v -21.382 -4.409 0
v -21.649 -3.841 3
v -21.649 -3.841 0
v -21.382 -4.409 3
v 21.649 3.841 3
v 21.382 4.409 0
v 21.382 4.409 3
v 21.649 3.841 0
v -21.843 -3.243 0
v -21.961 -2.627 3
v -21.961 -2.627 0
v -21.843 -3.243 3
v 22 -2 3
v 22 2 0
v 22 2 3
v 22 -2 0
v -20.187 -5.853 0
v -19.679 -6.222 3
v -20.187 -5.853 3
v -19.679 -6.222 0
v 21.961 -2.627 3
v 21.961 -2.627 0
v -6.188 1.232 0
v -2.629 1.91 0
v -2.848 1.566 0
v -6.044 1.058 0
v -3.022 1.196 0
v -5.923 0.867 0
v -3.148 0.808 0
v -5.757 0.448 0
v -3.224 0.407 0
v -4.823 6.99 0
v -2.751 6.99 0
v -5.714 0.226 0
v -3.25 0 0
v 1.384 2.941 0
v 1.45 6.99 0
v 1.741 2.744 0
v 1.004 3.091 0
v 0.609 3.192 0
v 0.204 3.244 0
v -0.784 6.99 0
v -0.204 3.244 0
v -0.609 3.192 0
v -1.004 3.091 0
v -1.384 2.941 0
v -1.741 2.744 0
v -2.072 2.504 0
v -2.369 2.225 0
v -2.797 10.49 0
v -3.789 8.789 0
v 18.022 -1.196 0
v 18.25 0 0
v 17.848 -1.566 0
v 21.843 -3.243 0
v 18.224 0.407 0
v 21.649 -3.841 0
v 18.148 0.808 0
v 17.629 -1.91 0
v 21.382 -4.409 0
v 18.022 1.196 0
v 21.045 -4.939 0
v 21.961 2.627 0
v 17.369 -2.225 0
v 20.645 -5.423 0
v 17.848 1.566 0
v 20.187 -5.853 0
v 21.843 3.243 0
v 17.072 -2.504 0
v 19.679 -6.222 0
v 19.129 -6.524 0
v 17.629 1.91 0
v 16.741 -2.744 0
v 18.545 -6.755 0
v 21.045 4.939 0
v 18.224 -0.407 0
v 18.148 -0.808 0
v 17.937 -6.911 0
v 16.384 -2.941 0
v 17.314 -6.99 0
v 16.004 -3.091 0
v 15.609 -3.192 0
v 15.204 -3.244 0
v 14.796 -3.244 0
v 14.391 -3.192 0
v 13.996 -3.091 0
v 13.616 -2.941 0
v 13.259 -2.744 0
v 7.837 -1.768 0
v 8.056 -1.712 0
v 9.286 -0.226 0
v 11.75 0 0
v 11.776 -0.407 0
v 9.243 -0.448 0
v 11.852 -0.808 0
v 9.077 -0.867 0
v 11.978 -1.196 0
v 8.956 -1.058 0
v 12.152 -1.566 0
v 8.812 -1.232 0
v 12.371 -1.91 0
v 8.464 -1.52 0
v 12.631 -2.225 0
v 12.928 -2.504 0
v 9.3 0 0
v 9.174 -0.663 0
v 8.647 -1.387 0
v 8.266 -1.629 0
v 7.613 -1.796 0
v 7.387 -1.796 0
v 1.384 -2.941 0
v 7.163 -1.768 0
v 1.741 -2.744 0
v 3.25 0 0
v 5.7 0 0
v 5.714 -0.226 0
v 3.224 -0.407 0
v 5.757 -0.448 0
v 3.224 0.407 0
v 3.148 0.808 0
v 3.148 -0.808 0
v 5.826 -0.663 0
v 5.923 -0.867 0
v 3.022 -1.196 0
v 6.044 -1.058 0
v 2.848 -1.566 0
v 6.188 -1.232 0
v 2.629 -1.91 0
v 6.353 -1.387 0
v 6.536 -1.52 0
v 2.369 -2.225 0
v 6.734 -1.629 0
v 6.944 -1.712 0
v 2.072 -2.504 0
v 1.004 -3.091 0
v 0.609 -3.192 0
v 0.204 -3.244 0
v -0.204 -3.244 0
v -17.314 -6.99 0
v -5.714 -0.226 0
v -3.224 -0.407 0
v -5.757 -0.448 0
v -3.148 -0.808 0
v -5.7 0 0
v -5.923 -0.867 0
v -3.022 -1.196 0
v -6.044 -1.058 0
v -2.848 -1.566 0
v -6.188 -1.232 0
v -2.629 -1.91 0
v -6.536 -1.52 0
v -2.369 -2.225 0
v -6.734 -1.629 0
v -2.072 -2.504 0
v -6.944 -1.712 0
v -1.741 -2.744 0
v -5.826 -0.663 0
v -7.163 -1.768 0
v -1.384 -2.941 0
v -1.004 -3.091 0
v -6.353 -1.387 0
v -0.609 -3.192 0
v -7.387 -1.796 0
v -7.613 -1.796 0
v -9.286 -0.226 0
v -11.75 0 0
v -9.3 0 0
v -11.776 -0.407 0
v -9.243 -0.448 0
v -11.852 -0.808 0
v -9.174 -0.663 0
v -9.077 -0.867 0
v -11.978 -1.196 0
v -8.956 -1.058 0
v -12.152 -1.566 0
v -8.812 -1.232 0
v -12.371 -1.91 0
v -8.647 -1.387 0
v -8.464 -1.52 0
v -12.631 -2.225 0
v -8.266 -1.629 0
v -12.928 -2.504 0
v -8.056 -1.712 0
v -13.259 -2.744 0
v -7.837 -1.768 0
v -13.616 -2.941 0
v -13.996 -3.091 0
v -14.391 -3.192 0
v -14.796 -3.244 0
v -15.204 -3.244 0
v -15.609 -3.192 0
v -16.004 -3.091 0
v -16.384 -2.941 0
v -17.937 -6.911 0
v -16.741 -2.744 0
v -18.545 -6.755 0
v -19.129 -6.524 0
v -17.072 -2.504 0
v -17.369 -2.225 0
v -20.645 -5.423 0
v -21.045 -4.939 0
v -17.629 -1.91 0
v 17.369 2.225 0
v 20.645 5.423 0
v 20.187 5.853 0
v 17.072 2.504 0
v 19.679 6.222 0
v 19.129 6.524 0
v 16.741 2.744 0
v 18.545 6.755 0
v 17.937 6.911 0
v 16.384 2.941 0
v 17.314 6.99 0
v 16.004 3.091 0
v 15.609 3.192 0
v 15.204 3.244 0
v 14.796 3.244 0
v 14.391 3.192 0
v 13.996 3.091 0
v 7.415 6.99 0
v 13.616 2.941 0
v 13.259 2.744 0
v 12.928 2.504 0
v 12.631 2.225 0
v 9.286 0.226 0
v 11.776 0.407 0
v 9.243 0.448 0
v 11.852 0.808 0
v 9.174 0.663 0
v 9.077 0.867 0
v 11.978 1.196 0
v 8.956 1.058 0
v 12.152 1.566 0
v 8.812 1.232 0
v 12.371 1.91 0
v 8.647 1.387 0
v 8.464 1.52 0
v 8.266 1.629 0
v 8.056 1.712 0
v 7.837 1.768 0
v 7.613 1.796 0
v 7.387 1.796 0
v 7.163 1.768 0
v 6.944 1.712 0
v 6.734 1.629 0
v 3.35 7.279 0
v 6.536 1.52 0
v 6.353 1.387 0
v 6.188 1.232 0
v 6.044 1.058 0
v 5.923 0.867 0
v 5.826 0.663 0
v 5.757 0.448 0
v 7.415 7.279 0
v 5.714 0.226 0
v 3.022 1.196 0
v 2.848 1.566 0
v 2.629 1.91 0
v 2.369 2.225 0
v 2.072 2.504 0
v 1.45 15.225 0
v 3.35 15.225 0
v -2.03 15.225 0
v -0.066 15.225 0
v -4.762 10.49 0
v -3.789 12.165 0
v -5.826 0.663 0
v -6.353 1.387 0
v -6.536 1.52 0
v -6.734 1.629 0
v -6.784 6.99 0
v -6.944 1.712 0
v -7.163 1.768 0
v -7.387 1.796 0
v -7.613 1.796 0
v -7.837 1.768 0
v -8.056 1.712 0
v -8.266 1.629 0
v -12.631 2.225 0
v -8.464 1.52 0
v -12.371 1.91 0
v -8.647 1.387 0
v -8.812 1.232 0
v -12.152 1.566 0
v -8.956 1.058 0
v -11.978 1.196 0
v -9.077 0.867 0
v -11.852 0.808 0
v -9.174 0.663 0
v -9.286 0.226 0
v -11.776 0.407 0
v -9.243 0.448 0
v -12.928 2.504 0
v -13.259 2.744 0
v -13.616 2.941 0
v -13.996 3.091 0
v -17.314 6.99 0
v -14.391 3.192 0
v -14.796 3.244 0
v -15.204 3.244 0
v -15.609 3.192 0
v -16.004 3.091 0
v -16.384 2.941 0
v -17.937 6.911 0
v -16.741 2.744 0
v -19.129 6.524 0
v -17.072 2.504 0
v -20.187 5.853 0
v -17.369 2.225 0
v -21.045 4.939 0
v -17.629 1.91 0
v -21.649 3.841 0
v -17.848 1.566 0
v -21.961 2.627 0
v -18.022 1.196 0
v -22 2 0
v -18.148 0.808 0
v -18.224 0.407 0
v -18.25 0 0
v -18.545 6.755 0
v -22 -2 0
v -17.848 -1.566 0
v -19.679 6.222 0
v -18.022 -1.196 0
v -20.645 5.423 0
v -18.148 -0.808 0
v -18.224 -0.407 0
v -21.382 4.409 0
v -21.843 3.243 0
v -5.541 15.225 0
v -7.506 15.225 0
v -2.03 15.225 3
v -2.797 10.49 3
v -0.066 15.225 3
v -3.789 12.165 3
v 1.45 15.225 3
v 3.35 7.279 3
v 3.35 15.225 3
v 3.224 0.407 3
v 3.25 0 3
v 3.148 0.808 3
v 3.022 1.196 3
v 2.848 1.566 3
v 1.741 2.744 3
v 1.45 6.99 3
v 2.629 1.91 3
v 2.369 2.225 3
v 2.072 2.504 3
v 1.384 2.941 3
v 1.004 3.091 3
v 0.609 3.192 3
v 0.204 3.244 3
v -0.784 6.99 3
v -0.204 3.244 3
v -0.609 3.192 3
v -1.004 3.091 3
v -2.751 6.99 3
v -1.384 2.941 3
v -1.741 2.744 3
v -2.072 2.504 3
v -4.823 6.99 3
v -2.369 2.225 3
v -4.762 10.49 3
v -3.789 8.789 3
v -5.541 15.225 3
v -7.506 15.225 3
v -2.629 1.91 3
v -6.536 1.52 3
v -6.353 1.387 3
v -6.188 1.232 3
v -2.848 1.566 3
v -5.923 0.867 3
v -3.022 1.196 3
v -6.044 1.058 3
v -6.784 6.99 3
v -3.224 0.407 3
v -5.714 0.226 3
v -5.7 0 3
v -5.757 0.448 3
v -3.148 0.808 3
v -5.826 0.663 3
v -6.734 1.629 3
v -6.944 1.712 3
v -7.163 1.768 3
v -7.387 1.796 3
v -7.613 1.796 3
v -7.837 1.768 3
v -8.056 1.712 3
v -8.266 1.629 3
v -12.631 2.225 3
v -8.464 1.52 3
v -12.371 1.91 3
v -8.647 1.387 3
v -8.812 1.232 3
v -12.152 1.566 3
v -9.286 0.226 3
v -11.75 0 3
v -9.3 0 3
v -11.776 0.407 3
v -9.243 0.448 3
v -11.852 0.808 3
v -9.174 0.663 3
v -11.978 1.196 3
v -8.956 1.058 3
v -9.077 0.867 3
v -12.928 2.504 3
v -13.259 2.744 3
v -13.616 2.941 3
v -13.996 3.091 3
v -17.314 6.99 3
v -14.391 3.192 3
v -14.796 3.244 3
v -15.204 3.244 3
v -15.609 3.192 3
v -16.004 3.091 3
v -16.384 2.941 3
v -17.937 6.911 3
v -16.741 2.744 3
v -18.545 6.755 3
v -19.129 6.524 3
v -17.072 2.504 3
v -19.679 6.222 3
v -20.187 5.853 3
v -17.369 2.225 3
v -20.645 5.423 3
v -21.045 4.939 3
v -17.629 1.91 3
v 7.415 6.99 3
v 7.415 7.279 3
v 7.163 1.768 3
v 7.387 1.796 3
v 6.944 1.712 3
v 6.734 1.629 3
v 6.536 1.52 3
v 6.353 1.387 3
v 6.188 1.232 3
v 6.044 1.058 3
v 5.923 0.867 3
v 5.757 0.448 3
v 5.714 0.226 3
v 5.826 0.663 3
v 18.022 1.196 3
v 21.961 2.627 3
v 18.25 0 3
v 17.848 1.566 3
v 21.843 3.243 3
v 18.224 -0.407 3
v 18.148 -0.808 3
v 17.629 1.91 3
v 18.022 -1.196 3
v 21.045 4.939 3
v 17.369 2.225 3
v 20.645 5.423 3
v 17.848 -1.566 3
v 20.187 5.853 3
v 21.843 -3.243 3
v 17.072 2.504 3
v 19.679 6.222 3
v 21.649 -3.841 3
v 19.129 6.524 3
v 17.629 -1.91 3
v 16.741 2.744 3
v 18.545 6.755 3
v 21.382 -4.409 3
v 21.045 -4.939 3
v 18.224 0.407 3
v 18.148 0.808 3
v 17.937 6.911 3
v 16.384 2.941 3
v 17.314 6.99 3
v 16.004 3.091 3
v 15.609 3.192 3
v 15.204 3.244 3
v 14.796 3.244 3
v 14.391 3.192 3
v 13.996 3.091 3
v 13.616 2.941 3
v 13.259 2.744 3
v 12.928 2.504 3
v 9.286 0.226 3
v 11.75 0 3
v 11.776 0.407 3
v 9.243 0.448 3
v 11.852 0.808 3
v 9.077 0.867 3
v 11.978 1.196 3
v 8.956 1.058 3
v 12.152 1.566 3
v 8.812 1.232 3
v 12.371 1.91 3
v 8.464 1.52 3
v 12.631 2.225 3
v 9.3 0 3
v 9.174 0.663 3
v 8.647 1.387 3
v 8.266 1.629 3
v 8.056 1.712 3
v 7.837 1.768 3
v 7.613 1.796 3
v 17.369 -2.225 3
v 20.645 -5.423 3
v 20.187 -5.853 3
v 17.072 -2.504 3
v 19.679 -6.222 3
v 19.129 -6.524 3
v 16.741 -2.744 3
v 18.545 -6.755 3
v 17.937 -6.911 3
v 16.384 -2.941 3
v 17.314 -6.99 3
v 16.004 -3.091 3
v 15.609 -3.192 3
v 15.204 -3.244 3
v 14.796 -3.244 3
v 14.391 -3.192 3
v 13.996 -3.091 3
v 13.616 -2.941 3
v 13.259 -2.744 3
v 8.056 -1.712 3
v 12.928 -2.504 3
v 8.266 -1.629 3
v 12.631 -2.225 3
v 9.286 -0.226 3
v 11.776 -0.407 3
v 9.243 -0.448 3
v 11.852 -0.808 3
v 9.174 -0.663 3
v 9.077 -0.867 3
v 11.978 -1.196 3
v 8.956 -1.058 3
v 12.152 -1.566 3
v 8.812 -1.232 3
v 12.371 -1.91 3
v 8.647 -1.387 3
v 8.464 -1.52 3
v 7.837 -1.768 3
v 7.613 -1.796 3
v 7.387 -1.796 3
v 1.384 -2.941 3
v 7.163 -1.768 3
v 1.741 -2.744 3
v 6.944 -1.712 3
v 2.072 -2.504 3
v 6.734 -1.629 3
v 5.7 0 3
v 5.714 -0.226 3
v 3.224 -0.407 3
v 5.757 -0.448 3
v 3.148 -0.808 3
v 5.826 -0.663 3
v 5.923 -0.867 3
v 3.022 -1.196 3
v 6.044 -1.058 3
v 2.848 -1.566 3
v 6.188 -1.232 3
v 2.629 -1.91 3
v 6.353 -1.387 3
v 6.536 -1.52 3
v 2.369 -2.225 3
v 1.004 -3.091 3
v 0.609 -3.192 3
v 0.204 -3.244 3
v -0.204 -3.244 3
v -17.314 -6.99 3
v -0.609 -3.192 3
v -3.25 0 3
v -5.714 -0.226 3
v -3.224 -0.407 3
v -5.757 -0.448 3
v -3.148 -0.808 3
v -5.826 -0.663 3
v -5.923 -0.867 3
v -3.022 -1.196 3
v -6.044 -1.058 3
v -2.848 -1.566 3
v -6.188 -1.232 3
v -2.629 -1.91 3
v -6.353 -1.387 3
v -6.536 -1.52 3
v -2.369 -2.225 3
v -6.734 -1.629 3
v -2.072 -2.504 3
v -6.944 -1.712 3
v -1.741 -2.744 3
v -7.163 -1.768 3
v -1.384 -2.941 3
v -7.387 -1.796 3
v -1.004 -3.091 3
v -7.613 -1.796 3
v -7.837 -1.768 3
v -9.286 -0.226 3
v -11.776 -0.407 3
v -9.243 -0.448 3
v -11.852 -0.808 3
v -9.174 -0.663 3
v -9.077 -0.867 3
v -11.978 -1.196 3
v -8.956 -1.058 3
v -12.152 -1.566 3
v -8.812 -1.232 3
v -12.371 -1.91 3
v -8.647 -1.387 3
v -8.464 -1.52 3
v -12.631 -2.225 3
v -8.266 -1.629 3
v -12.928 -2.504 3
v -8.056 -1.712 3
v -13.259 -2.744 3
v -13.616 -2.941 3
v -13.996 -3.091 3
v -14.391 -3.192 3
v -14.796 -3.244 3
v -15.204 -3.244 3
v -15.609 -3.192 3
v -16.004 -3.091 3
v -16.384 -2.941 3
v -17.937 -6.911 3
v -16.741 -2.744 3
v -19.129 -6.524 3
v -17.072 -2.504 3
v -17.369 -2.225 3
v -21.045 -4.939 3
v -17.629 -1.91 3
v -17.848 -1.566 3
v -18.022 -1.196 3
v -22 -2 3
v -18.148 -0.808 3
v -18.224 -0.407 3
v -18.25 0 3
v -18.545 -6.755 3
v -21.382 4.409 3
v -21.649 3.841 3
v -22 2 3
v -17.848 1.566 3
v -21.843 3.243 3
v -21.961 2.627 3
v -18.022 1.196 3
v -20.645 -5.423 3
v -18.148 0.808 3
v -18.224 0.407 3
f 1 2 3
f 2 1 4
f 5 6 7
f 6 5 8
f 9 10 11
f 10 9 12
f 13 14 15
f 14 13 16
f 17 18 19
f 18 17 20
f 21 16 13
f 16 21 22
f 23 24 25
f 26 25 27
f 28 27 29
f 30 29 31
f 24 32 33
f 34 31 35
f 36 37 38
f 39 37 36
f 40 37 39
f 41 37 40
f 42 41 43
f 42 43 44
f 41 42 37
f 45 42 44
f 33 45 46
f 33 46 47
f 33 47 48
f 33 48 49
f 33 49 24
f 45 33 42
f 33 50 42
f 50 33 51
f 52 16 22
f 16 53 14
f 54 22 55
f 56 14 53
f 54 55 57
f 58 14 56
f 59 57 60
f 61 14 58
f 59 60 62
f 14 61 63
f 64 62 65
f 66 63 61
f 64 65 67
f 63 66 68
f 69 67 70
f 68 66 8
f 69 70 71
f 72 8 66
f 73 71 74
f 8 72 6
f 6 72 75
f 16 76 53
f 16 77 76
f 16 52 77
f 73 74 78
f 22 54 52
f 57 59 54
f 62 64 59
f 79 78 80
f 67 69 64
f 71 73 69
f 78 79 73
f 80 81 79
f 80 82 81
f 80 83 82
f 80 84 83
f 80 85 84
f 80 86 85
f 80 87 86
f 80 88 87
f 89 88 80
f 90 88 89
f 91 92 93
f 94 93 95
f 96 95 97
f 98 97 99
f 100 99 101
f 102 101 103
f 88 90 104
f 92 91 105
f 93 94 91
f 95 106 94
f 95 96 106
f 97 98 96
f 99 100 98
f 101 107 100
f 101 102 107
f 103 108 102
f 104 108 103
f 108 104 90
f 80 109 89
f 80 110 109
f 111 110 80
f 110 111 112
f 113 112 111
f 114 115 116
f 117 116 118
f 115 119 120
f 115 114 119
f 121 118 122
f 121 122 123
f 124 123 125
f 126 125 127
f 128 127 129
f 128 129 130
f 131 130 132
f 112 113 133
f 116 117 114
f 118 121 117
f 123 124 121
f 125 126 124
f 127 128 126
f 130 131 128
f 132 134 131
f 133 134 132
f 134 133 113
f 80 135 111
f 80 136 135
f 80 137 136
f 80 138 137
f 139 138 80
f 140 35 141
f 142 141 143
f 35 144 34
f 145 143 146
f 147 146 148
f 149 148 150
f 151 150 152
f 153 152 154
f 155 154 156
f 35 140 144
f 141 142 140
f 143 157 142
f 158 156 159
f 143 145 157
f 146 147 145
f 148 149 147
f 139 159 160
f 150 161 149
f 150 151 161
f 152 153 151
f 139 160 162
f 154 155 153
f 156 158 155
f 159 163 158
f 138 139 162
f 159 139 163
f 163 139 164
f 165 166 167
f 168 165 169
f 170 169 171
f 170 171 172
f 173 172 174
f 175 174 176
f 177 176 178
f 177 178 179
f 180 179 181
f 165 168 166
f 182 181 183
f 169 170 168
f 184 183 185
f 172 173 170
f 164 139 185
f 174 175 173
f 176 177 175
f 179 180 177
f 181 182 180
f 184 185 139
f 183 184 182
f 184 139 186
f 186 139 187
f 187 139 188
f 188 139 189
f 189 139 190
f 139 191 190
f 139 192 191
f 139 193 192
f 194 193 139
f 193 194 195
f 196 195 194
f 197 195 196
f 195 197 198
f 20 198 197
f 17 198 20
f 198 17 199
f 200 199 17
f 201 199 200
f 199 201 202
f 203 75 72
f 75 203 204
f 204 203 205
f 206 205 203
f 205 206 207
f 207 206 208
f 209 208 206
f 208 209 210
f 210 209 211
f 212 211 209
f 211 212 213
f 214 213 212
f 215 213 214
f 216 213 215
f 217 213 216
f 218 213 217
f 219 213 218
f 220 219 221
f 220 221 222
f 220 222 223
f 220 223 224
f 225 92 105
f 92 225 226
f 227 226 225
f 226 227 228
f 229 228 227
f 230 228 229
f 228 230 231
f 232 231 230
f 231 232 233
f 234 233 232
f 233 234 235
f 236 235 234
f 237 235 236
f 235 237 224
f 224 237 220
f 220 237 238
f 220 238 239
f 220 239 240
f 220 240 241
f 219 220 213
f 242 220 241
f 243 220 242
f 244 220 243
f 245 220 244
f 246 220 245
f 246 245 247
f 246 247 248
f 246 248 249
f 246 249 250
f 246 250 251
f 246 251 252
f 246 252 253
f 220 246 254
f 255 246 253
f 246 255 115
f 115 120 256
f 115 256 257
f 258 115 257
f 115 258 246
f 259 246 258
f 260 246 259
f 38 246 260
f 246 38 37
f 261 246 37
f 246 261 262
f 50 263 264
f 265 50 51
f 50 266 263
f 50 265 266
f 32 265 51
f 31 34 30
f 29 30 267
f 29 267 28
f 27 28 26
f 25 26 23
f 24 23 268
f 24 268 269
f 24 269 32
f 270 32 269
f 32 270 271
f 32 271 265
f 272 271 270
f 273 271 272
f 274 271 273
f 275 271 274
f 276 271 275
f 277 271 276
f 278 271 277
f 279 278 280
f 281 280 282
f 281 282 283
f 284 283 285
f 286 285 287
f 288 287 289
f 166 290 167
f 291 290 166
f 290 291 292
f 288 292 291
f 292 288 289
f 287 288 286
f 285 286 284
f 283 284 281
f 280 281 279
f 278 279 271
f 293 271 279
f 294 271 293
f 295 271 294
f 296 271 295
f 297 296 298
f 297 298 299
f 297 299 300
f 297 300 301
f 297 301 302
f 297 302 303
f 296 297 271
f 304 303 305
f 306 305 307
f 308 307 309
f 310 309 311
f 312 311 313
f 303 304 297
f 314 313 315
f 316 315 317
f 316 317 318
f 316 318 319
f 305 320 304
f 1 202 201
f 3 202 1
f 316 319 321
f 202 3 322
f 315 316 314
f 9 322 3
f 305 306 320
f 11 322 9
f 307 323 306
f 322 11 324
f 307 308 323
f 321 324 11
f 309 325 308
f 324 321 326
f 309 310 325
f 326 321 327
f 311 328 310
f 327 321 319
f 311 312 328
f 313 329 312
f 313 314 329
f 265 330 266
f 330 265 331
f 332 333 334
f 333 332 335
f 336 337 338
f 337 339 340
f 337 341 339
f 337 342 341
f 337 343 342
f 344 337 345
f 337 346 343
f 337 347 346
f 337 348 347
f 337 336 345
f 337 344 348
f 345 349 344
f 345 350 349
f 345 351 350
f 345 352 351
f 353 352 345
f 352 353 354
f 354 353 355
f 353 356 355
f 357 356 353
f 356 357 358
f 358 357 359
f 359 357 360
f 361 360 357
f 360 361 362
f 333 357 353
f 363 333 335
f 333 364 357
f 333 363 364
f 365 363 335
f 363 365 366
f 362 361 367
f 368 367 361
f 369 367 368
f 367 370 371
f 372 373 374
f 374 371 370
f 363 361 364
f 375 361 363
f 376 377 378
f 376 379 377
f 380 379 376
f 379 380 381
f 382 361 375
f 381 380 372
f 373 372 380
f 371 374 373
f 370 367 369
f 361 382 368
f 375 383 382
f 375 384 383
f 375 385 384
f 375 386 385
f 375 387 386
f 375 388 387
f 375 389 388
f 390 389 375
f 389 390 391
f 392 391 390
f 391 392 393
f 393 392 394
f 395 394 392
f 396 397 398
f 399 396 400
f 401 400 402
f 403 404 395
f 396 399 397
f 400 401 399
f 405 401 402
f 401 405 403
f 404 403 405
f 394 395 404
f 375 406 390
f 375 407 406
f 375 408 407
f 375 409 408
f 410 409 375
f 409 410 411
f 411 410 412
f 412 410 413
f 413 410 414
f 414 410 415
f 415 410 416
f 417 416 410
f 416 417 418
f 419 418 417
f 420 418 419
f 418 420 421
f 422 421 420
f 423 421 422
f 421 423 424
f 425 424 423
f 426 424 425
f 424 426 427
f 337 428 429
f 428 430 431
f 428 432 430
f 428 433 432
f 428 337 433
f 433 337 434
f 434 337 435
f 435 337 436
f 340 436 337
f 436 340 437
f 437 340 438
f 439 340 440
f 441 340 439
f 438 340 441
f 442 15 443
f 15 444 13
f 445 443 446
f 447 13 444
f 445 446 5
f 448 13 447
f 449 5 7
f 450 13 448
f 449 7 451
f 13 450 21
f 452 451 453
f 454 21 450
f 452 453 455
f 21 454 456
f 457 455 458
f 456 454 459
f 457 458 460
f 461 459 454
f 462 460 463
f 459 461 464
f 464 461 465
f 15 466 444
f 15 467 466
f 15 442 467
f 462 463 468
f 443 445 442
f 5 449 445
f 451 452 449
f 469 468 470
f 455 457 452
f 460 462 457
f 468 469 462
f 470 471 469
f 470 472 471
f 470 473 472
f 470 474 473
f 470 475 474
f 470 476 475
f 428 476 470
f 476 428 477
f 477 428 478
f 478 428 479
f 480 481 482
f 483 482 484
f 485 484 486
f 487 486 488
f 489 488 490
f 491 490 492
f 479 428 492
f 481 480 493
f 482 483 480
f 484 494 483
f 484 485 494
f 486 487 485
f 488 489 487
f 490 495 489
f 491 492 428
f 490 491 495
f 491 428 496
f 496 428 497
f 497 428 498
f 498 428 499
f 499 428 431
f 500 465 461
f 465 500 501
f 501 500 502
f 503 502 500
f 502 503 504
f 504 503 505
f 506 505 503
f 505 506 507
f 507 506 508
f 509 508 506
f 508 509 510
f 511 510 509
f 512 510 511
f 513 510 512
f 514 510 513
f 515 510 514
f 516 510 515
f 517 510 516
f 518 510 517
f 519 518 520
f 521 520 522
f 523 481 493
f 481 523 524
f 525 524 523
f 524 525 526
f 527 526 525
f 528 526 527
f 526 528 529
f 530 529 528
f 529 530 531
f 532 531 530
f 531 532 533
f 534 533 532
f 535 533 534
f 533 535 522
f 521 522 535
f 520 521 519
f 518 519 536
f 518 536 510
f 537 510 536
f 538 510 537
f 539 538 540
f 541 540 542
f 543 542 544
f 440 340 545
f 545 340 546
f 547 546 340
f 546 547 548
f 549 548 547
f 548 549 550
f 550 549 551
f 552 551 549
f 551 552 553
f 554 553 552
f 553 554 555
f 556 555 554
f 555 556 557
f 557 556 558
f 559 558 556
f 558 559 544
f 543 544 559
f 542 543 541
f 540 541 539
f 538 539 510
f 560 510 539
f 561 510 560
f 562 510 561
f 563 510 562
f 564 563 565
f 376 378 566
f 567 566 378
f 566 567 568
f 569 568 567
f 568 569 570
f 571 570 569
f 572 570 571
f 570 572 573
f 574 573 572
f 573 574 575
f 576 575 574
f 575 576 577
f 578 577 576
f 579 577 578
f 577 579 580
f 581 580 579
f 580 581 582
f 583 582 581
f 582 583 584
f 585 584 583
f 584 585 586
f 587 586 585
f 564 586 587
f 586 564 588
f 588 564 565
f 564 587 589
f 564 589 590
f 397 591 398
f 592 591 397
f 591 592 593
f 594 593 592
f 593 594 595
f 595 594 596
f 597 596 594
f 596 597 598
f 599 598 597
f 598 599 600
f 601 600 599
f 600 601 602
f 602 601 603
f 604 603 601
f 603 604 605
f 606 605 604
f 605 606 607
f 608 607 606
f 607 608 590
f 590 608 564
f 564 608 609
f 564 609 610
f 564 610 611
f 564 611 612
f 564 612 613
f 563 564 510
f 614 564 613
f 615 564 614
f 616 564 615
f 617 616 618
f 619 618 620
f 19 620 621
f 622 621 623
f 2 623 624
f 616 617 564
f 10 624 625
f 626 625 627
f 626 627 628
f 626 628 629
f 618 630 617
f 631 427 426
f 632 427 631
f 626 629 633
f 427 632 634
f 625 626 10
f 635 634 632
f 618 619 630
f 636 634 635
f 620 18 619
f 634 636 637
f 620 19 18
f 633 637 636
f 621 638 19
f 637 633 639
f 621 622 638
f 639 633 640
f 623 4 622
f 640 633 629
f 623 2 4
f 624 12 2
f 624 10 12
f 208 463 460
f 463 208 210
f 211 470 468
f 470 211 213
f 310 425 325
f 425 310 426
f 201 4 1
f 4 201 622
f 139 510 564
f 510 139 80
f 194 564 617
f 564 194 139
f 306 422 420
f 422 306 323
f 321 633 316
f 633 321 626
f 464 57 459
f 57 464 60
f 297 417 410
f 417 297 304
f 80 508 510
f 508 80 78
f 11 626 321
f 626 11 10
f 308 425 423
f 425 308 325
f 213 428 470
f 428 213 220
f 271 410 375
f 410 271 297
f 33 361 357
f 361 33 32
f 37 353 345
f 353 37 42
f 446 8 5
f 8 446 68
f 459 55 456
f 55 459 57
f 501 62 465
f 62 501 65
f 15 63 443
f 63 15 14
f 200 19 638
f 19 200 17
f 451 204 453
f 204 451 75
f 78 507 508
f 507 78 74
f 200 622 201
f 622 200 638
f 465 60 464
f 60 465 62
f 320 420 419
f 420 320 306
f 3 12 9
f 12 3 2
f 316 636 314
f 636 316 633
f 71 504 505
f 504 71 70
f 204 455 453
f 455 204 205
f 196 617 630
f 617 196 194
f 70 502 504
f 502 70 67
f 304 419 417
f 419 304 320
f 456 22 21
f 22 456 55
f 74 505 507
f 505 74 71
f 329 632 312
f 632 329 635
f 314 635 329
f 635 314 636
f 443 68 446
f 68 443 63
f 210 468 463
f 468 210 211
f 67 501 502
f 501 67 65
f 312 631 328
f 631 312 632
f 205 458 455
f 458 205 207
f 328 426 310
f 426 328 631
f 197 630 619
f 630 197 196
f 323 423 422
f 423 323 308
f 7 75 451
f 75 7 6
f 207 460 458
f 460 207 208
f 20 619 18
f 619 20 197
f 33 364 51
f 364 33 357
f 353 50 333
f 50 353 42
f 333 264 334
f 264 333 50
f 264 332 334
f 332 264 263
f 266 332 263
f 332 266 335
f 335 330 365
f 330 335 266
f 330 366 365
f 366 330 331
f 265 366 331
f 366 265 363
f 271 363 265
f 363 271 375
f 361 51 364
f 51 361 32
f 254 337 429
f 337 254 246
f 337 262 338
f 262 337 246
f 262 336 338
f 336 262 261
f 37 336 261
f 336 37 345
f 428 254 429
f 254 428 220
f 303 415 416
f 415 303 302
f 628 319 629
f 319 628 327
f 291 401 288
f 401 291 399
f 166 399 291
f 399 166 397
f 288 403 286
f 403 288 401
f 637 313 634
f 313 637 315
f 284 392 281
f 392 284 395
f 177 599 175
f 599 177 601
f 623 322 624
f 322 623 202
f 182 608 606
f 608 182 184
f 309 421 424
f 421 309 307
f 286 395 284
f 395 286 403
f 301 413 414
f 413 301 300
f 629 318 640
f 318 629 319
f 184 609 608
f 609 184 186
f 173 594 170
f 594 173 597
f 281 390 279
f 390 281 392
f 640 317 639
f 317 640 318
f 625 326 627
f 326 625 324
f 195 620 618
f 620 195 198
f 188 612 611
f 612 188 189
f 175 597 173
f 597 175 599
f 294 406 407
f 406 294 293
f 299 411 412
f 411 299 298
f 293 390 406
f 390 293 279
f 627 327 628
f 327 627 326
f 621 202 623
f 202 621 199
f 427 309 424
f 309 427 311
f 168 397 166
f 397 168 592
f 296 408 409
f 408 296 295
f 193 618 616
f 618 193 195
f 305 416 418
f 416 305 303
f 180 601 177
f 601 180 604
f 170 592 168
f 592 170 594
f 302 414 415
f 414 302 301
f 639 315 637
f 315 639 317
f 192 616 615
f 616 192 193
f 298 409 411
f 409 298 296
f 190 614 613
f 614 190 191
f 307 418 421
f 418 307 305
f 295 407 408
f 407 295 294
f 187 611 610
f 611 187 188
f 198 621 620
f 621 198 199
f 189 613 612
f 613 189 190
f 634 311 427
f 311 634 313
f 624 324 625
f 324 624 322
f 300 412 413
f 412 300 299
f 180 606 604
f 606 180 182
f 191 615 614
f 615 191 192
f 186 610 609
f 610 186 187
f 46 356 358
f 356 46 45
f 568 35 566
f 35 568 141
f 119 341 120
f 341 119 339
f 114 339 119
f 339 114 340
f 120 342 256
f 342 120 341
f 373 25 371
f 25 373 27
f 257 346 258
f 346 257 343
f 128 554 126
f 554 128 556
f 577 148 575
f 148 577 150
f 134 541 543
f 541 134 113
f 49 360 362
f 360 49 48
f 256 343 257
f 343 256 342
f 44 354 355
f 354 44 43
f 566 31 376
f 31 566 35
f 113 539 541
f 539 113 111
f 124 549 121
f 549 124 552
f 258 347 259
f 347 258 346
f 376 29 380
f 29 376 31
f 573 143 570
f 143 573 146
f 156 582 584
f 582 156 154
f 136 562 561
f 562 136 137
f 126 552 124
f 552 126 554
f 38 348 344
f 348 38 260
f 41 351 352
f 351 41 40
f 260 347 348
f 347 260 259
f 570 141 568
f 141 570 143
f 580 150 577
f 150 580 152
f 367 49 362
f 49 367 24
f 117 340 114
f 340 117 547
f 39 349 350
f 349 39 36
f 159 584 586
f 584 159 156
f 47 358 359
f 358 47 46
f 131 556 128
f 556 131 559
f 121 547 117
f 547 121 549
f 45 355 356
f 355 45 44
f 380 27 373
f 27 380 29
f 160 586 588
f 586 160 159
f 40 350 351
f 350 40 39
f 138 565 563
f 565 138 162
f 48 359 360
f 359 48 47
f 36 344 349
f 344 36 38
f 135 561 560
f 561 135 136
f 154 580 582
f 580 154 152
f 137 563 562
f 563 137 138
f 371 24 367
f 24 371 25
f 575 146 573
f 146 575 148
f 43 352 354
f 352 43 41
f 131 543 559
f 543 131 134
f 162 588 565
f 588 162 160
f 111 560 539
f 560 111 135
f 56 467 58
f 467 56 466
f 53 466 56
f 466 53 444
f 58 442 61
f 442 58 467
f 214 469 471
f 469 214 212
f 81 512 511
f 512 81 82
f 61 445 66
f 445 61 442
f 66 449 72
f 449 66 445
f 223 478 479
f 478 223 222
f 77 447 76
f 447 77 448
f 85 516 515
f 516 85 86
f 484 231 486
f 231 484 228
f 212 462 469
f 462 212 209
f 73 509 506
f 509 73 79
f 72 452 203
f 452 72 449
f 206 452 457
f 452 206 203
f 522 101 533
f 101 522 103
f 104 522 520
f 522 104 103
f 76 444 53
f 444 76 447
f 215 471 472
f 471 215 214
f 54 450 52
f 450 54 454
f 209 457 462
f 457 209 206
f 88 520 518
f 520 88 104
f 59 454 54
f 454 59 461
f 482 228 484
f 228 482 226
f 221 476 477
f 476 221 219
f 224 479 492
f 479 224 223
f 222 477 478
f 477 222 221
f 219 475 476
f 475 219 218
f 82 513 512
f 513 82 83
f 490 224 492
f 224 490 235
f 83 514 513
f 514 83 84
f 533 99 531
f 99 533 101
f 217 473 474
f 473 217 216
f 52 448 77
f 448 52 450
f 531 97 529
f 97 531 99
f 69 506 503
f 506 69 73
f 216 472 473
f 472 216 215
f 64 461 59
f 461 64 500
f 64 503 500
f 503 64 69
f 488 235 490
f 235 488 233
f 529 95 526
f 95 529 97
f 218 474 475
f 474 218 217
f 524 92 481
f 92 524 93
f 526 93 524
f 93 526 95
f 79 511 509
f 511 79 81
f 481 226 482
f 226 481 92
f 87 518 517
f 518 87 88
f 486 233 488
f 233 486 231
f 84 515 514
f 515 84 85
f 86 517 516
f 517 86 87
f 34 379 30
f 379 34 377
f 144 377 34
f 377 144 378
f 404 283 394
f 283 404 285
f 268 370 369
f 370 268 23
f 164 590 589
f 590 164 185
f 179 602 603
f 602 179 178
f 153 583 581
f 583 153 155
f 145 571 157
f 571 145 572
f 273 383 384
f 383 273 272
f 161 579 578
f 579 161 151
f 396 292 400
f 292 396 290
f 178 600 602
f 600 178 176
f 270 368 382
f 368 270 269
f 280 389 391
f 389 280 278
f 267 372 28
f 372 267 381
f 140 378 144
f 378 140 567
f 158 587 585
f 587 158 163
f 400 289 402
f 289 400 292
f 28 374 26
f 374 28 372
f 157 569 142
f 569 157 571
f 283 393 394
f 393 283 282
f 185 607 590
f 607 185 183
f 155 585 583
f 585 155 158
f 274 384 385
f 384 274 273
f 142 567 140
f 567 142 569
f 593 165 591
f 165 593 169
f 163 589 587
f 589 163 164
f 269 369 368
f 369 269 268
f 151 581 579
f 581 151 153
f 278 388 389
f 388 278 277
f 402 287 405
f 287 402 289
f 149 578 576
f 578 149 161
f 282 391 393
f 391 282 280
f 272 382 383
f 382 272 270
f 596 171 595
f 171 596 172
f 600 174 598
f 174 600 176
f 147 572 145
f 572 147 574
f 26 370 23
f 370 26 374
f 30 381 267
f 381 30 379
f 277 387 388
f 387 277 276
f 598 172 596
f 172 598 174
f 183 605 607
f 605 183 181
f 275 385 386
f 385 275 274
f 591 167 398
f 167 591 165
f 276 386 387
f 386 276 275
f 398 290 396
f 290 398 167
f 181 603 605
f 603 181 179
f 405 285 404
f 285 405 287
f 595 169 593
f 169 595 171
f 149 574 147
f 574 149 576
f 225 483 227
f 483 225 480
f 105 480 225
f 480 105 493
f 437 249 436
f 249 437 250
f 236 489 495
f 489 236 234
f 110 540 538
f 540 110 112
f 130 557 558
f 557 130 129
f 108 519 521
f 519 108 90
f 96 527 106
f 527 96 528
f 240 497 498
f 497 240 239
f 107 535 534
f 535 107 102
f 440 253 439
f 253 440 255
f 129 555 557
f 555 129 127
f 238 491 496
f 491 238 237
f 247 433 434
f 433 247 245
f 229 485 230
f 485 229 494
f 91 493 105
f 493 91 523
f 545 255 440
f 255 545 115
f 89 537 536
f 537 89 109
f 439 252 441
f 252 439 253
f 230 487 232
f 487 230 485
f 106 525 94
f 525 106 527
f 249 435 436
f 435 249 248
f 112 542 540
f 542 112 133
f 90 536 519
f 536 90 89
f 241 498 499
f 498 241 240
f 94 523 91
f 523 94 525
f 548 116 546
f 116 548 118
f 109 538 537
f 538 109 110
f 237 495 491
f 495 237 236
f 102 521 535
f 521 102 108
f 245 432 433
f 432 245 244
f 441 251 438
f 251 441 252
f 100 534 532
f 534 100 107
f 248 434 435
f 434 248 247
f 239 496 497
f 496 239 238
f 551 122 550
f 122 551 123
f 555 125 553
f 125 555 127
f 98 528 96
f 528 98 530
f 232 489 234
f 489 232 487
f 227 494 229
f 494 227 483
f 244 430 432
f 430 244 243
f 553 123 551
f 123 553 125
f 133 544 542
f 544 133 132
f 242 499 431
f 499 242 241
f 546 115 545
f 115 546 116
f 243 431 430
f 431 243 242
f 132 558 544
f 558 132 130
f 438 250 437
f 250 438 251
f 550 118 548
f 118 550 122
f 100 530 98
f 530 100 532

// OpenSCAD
$fn = 50;


difference() {
	union() {
		hull() {
			translate(v = [-17.0000000000, 2.0000000000, 0]) {
				cylinder(h = 3, r = 5);
			}
			translate(v = [17.0000000000, 2.0000000000, 0]) {
				cylinder(h = 3, r = 5);
			}
			translate(v = [-17.0000000000, -2.0000000000, 0]) {
				cylinder(h = 3, r = 5);
			}
			translate(v = [17.0000000000, -2.0000000000, 0]) {
				cylinder(h = 3, r = 5);
			}
		}
		translate(v = [0, 15.0000000000, 0]) {
			linear_extrude(height = 3) {
				text(font = "DejaVu Sans Mono:style=Bold", halign = "center", size = 9.5000000000, text = "XL", valign = "top");
			}
		}
	}
	union() {
		translate(v = [-15.0000000000, 0.0000000000, 0]) {
			translate(v = [0, 0, -100]) {
				cylinder(h = 200, r = 3.2500000000);
			}
		}
		translate(v = [0, 0, -100]) {
			cylinder(h = 200, r = 3.2500000000);
		}
		translate(v = [15.0000000000, 0.0000000000, 0]) {
			translate(v = [0, 0, -100]) {
				cylinder(h = 200, r = 3.2500000000);
			}
		}
		translate(v = [-15.0000000000, 0.0000000000, 0]) {
			translate(v = [0, 0, -100]) {
				cylinder(h = 200, r = 1.8000000000);
			}
		}
		translate(v = [-7.5000000000, 0.0000000000, 0]) {
			translate(v = [0, 0, -100]) {
				cylinder(h = 200, r = 1.8000000000);
			}
		}
		translate(v = [0, 0, -100]) {
			cylinder(h = 200, r = 1.8000000000);
		}
		translate(v = [7.5000000000, 0.0000000000, 0]) {
			translate(v = [0, 0, -100]) {
				cylinder(h = 200, r = 1.8000000000);
			}
		}
		translate(v = [15.0000000000, 0.0000000000, 0]) {
			translate(v = [0, 0, -100]) {
				cylinder(h = 200, r = 1.8000000000);
			}
		}
	}
}
